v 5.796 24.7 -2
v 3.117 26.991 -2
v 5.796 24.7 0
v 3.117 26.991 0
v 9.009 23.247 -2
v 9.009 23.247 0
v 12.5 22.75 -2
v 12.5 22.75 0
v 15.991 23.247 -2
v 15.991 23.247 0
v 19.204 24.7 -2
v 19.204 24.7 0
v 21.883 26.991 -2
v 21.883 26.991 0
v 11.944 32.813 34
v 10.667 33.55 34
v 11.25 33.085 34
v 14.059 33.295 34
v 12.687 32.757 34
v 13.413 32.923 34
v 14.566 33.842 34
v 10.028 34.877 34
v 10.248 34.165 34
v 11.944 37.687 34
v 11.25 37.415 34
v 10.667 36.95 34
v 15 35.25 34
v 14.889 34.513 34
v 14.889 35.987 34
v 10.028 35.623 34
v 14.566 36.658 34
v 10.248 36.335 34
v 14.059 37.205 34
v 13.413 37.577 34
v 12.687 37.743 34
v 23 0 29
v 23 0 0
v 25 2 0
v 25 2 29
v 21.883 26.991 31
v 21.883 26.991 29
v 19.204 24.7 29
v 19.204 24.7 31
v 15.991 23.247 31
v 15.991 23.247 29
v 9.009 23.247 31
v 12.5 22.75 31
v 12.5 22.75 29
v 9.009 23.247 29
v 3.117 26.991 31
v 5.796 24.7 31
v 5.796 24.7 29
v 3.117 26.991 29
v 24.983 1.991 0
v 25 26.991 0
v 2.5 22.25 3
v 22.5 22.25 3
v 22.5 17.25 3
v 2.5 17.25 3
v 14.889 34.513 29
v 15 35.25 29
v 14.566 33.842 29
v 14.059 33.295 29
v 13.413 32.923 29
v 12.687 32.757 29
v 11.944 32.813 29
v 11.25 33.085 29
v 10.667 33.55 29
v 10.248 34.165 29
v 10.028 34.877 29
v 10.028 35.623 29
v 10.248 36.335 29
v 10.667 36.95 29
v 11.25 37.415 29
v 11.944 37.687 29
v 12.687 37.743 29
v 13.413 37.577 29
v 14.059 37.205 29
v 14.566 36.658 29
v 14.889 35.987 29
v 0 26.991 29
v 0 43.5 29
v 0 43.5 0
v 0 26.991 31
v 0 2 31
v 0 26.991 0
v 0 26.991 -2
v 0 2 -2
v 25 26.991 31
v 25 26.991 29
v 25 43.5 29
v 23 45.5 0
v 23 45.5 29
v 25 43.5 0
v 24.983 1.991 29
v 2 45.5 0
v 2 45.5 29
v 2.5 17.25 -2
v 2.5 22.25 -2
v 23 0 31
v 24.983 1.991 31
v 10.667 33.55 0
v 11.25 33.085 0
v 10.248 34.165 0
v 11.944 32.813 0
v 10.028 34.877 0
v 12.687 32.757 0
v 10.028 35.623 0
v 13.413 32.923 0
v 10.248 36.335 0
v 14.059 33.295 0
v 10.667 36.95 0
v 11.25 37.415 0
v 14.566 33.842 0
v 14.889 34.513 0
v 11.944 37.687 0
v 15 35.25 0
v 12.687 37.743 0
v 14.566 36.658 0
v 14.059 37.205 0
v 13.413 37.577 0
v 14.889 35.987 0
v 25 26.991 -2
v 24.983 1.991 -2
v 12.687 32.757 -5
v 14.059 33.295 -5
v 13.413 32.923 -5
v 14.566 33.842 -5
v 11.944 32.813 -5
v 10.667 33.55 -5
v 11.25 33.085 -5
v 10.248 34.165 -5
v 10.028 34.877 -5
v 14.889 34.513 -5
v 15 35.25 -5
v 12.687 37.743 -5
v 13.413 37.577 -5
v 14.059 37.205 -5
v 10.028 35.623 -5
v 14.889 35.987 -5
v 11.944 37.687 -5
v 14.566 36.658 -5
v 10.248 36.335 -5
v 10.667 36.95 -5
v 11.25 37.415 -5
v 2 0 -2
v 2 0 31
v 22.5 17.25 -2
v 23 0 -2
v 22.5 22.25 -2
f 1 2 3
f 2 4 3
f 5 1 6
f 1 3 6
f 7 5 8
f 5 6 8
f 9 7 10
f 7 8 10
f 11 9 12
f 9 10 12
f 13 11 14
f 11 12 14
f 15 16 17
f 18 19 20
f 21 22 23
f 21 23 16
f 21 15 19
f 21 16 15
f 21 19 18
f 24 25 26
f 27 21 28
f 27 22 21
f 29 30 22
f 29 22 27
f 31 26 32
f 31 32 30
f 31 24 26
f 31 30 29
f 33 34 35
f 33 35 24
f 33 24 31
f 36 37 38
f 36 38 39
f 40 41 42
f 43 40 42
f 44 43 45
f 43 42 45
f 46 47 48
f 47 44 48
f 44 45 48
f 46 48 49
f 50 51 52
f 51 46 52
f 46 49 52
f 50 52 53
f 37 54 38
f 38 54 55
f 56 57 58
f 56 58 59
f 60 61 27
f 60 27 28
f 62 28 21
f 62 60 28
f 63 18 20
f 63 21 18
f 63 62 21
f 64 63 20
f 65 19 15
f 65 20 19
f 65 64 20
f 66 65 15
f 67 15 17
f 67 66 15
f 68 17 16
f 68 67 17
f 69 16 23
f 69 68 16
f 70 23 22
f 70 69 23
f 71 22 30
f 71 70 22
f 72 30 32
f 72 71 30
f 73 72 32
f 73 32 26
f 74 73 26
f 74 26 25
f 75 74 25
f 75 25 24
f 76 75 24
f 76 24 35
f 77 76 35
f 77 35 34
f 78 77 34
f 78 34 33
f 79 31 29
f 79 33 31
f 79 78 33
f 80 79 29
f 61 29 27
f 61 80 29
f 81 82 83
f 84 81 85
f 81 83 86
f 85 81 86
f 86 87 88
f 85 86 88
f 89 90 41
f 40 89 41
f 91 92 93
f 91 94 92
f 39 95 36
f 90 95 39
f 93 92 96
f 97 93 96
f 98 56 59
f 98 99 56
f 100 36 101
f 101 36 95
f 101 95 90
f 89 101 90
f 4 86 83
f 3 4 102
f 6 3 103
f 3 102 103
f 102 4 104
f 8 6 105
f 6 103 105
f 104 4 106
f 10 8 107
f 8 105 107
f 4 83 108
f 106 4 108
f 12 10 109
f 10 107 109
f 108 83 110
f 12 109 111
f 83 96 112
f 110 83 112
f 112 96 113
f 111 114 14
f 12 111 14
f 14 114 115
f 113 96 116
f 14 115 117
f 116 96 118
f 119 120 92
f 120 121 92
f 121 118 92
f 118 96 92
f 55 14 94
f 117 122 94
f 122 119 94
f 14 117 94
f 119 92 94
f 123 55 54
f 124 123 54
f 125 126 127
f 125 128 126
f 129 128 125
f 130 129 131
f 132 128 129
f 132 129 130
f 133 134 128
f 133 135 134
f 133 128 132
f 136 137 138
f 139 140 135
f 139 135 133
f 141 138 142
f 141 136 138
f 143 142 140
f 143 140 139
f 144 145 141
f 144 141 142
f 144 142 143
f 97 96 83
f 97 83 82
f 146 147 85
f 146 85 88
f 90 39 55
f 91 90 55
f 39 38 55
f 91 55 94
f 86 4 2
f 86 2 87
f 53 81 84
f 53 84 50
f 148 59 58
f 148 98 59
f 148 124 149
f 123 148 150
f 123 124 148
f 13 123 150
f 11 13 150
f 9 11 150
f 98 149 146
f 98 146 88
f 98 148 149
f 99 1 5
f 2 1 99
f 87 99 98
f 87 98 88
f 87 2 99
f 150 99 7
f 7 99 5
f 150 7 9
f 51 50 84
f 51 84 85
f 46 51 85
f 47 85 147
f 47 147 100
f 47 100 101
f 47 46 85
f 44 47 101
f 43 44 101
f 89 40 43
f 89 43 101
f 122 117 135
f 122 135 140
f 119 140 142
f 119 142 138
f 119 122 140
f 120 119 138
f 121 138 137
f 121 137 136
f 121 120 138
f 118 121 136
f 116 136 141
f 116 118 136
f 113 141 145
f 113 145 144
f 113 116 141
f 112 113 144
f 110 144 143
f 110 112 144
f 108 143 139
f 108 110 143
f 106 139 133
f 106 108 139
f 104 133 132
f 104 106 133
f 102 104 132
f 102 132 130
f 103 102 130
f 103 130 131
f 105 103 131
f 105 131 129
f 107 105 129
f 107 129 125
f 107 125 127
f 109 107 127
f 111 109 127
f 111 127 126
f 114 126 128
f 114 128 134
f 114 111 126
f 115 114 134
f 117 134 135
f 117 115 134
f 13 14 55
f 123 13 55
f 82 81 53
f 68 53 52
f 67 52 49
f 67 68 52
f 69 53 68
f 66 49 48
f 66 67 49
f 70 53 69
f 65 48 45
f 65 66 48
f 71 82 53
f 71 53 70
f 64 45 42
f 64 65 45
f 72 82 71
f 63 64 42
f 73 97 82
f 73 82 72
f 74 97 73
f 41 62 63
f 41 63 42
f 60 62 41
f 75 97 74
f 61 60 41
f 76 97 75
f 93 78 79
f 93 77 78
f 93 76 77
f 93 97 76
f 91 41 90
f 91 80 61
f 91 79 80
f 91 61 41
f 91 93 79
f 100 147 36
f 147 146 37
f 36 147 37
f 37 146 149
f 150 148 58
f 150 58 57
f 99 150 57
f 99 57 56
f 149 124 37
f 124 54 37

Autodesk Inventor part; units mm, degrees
ref_plane "YZ Plane" through (0, 0, 0) normal (1, 0, 0) x (0, 1, 0)
ref_plane "XZ Plane" through (0, 0, 0) normal (0, 1, 0) x (-1, 0, 0)
ref_plane "XY Plane" through (0, 0, 0) normal (0, 0, 1) x (1, 0, 0)
sketch "Sketch1" plane through (0, 0, 0) normal (0, 0, 1) x (1, 0, 0)
  line L0 (0, 0) -> (25, 0)
  line L1 (25, 0) -> (25, 45.5)
  line L2 (25, 45.5) -> (0, 45.5)
  line L3 (0, 45.5) -> (0, 0)
  dimension "d0" = 25
  dimension "d1" = 45.5
extrude "Extrusion1" add sketch "Sketch1" along normal blind 29
chamfer "Chamfer1" distance 2 angle 45 4 edges at (25, 45.5, 14.5) (0, 45.5, 14.5) (25, 0, 14.5) (0, 0, 14.5)
sketch "Sketch2" plane through (0, 0, 29) normal (0, 0, 1) x (1, 0, 0)
  line L0 (23, 45.5) -> (2, 45.5) projected
  line L1 (12.5, 45.5) -> (12.5, 0)
  line L2 (2, 0) -> (23, 0) projected
  line L3 (12.5, 22.75) -> (12.5, 35.25)
  circle A0 centre (12.5, 35.25) radius 12.5
  line L4 (12.5, 0) -> (2, 0)
  line L5 (0, 2) -> (2, 0) projected
  line L6 (2, 0) -> (0, 1.9914)
  line L7 (0, 1.9914) -> (0, 26.9914)
  line L8 (0, 43.5) -> (0, 2) projected
  line L9 (0, 26.9914) -> (3.1167, 26.9914)
  line L10 (12.5, 0) -> (23, 0)
  line L11 (23, 0) -> (24.9828, 1.9914)
  line L12 (24.9828, 1.9914) -> (23, 0)
  line L13 (24.9828, 1.9914) -> (25, 26.9914)
  line L14 (25, 2) -> (25, 43.5) projected
  line L15 (25, 26.9914) -> (21.8833, 26.9914)
  point P0 (0, 0)
  dimension "d8" = 12.5
  dimension "d9" = 25
  dimension "d10" = 25
extrude "Extrusion2" add sketch "Sketch2" along normal blind 2 contours L15 L13 L11 L2 L1 A0 | L1 L2 L5 L7 L9 A0
ref_plane "Work Plane1" through (0, 0, 14.5) normal (0, 0, 1) x (1, 0, 0)
sketch "Sketch3" plane through (0, 0, 29) normal (0, 0, 1) x (1, 0, 0)
  arc A0 (3.1167, 26.9914) -> (21.8833, 26.9914) centre (12.5, 35.25) ccw projected
  circle A1 centre (12.5, 35.25) radius 2.5
  point P0 (0, 0)
  dimension "d13" = 5
extrude "Extrusion3" add sketch "Sketch3" along normal blind 5
mirror "Mirror1" about plane through (0, 0, 14.5) normal (0, 0, 1) of "Extrusion2", "Extrusion3"
sketch "Sketch5" plane through (12.5, 35.25, -2) normal (0, 0, -1) x (-1, 0, 0)
  circle A0 centre (0, 0) radius 2.5 projected
  line L0 (0, 0) -> (0, -13)
  line L1 (0, -13) -> (10, -13)
  line L2 (10, -13) -> (10, -18)
  line L3 (10, -18) -> (-10, -18)
  line L4 (-10, -18) -> (-10, -13)
  line L5 (-10, -13) -> (0, -13)
  point P0 (12.5, -35.25)
  dimension "d16" = 13
  dimension "d17" = 10
  dimension "d18" = 5
  dimension "d19" = 20
extrude "Extrusion4" cut sketch "Sketch5" against normal blind 5 contours L1 L2 L3 L4 L5
ref_plane "Work Plane2" through (0, 0, 14.5) normal (0, 0, 1) x (1, 0, 0)
properties part number "feetech_sc215"
